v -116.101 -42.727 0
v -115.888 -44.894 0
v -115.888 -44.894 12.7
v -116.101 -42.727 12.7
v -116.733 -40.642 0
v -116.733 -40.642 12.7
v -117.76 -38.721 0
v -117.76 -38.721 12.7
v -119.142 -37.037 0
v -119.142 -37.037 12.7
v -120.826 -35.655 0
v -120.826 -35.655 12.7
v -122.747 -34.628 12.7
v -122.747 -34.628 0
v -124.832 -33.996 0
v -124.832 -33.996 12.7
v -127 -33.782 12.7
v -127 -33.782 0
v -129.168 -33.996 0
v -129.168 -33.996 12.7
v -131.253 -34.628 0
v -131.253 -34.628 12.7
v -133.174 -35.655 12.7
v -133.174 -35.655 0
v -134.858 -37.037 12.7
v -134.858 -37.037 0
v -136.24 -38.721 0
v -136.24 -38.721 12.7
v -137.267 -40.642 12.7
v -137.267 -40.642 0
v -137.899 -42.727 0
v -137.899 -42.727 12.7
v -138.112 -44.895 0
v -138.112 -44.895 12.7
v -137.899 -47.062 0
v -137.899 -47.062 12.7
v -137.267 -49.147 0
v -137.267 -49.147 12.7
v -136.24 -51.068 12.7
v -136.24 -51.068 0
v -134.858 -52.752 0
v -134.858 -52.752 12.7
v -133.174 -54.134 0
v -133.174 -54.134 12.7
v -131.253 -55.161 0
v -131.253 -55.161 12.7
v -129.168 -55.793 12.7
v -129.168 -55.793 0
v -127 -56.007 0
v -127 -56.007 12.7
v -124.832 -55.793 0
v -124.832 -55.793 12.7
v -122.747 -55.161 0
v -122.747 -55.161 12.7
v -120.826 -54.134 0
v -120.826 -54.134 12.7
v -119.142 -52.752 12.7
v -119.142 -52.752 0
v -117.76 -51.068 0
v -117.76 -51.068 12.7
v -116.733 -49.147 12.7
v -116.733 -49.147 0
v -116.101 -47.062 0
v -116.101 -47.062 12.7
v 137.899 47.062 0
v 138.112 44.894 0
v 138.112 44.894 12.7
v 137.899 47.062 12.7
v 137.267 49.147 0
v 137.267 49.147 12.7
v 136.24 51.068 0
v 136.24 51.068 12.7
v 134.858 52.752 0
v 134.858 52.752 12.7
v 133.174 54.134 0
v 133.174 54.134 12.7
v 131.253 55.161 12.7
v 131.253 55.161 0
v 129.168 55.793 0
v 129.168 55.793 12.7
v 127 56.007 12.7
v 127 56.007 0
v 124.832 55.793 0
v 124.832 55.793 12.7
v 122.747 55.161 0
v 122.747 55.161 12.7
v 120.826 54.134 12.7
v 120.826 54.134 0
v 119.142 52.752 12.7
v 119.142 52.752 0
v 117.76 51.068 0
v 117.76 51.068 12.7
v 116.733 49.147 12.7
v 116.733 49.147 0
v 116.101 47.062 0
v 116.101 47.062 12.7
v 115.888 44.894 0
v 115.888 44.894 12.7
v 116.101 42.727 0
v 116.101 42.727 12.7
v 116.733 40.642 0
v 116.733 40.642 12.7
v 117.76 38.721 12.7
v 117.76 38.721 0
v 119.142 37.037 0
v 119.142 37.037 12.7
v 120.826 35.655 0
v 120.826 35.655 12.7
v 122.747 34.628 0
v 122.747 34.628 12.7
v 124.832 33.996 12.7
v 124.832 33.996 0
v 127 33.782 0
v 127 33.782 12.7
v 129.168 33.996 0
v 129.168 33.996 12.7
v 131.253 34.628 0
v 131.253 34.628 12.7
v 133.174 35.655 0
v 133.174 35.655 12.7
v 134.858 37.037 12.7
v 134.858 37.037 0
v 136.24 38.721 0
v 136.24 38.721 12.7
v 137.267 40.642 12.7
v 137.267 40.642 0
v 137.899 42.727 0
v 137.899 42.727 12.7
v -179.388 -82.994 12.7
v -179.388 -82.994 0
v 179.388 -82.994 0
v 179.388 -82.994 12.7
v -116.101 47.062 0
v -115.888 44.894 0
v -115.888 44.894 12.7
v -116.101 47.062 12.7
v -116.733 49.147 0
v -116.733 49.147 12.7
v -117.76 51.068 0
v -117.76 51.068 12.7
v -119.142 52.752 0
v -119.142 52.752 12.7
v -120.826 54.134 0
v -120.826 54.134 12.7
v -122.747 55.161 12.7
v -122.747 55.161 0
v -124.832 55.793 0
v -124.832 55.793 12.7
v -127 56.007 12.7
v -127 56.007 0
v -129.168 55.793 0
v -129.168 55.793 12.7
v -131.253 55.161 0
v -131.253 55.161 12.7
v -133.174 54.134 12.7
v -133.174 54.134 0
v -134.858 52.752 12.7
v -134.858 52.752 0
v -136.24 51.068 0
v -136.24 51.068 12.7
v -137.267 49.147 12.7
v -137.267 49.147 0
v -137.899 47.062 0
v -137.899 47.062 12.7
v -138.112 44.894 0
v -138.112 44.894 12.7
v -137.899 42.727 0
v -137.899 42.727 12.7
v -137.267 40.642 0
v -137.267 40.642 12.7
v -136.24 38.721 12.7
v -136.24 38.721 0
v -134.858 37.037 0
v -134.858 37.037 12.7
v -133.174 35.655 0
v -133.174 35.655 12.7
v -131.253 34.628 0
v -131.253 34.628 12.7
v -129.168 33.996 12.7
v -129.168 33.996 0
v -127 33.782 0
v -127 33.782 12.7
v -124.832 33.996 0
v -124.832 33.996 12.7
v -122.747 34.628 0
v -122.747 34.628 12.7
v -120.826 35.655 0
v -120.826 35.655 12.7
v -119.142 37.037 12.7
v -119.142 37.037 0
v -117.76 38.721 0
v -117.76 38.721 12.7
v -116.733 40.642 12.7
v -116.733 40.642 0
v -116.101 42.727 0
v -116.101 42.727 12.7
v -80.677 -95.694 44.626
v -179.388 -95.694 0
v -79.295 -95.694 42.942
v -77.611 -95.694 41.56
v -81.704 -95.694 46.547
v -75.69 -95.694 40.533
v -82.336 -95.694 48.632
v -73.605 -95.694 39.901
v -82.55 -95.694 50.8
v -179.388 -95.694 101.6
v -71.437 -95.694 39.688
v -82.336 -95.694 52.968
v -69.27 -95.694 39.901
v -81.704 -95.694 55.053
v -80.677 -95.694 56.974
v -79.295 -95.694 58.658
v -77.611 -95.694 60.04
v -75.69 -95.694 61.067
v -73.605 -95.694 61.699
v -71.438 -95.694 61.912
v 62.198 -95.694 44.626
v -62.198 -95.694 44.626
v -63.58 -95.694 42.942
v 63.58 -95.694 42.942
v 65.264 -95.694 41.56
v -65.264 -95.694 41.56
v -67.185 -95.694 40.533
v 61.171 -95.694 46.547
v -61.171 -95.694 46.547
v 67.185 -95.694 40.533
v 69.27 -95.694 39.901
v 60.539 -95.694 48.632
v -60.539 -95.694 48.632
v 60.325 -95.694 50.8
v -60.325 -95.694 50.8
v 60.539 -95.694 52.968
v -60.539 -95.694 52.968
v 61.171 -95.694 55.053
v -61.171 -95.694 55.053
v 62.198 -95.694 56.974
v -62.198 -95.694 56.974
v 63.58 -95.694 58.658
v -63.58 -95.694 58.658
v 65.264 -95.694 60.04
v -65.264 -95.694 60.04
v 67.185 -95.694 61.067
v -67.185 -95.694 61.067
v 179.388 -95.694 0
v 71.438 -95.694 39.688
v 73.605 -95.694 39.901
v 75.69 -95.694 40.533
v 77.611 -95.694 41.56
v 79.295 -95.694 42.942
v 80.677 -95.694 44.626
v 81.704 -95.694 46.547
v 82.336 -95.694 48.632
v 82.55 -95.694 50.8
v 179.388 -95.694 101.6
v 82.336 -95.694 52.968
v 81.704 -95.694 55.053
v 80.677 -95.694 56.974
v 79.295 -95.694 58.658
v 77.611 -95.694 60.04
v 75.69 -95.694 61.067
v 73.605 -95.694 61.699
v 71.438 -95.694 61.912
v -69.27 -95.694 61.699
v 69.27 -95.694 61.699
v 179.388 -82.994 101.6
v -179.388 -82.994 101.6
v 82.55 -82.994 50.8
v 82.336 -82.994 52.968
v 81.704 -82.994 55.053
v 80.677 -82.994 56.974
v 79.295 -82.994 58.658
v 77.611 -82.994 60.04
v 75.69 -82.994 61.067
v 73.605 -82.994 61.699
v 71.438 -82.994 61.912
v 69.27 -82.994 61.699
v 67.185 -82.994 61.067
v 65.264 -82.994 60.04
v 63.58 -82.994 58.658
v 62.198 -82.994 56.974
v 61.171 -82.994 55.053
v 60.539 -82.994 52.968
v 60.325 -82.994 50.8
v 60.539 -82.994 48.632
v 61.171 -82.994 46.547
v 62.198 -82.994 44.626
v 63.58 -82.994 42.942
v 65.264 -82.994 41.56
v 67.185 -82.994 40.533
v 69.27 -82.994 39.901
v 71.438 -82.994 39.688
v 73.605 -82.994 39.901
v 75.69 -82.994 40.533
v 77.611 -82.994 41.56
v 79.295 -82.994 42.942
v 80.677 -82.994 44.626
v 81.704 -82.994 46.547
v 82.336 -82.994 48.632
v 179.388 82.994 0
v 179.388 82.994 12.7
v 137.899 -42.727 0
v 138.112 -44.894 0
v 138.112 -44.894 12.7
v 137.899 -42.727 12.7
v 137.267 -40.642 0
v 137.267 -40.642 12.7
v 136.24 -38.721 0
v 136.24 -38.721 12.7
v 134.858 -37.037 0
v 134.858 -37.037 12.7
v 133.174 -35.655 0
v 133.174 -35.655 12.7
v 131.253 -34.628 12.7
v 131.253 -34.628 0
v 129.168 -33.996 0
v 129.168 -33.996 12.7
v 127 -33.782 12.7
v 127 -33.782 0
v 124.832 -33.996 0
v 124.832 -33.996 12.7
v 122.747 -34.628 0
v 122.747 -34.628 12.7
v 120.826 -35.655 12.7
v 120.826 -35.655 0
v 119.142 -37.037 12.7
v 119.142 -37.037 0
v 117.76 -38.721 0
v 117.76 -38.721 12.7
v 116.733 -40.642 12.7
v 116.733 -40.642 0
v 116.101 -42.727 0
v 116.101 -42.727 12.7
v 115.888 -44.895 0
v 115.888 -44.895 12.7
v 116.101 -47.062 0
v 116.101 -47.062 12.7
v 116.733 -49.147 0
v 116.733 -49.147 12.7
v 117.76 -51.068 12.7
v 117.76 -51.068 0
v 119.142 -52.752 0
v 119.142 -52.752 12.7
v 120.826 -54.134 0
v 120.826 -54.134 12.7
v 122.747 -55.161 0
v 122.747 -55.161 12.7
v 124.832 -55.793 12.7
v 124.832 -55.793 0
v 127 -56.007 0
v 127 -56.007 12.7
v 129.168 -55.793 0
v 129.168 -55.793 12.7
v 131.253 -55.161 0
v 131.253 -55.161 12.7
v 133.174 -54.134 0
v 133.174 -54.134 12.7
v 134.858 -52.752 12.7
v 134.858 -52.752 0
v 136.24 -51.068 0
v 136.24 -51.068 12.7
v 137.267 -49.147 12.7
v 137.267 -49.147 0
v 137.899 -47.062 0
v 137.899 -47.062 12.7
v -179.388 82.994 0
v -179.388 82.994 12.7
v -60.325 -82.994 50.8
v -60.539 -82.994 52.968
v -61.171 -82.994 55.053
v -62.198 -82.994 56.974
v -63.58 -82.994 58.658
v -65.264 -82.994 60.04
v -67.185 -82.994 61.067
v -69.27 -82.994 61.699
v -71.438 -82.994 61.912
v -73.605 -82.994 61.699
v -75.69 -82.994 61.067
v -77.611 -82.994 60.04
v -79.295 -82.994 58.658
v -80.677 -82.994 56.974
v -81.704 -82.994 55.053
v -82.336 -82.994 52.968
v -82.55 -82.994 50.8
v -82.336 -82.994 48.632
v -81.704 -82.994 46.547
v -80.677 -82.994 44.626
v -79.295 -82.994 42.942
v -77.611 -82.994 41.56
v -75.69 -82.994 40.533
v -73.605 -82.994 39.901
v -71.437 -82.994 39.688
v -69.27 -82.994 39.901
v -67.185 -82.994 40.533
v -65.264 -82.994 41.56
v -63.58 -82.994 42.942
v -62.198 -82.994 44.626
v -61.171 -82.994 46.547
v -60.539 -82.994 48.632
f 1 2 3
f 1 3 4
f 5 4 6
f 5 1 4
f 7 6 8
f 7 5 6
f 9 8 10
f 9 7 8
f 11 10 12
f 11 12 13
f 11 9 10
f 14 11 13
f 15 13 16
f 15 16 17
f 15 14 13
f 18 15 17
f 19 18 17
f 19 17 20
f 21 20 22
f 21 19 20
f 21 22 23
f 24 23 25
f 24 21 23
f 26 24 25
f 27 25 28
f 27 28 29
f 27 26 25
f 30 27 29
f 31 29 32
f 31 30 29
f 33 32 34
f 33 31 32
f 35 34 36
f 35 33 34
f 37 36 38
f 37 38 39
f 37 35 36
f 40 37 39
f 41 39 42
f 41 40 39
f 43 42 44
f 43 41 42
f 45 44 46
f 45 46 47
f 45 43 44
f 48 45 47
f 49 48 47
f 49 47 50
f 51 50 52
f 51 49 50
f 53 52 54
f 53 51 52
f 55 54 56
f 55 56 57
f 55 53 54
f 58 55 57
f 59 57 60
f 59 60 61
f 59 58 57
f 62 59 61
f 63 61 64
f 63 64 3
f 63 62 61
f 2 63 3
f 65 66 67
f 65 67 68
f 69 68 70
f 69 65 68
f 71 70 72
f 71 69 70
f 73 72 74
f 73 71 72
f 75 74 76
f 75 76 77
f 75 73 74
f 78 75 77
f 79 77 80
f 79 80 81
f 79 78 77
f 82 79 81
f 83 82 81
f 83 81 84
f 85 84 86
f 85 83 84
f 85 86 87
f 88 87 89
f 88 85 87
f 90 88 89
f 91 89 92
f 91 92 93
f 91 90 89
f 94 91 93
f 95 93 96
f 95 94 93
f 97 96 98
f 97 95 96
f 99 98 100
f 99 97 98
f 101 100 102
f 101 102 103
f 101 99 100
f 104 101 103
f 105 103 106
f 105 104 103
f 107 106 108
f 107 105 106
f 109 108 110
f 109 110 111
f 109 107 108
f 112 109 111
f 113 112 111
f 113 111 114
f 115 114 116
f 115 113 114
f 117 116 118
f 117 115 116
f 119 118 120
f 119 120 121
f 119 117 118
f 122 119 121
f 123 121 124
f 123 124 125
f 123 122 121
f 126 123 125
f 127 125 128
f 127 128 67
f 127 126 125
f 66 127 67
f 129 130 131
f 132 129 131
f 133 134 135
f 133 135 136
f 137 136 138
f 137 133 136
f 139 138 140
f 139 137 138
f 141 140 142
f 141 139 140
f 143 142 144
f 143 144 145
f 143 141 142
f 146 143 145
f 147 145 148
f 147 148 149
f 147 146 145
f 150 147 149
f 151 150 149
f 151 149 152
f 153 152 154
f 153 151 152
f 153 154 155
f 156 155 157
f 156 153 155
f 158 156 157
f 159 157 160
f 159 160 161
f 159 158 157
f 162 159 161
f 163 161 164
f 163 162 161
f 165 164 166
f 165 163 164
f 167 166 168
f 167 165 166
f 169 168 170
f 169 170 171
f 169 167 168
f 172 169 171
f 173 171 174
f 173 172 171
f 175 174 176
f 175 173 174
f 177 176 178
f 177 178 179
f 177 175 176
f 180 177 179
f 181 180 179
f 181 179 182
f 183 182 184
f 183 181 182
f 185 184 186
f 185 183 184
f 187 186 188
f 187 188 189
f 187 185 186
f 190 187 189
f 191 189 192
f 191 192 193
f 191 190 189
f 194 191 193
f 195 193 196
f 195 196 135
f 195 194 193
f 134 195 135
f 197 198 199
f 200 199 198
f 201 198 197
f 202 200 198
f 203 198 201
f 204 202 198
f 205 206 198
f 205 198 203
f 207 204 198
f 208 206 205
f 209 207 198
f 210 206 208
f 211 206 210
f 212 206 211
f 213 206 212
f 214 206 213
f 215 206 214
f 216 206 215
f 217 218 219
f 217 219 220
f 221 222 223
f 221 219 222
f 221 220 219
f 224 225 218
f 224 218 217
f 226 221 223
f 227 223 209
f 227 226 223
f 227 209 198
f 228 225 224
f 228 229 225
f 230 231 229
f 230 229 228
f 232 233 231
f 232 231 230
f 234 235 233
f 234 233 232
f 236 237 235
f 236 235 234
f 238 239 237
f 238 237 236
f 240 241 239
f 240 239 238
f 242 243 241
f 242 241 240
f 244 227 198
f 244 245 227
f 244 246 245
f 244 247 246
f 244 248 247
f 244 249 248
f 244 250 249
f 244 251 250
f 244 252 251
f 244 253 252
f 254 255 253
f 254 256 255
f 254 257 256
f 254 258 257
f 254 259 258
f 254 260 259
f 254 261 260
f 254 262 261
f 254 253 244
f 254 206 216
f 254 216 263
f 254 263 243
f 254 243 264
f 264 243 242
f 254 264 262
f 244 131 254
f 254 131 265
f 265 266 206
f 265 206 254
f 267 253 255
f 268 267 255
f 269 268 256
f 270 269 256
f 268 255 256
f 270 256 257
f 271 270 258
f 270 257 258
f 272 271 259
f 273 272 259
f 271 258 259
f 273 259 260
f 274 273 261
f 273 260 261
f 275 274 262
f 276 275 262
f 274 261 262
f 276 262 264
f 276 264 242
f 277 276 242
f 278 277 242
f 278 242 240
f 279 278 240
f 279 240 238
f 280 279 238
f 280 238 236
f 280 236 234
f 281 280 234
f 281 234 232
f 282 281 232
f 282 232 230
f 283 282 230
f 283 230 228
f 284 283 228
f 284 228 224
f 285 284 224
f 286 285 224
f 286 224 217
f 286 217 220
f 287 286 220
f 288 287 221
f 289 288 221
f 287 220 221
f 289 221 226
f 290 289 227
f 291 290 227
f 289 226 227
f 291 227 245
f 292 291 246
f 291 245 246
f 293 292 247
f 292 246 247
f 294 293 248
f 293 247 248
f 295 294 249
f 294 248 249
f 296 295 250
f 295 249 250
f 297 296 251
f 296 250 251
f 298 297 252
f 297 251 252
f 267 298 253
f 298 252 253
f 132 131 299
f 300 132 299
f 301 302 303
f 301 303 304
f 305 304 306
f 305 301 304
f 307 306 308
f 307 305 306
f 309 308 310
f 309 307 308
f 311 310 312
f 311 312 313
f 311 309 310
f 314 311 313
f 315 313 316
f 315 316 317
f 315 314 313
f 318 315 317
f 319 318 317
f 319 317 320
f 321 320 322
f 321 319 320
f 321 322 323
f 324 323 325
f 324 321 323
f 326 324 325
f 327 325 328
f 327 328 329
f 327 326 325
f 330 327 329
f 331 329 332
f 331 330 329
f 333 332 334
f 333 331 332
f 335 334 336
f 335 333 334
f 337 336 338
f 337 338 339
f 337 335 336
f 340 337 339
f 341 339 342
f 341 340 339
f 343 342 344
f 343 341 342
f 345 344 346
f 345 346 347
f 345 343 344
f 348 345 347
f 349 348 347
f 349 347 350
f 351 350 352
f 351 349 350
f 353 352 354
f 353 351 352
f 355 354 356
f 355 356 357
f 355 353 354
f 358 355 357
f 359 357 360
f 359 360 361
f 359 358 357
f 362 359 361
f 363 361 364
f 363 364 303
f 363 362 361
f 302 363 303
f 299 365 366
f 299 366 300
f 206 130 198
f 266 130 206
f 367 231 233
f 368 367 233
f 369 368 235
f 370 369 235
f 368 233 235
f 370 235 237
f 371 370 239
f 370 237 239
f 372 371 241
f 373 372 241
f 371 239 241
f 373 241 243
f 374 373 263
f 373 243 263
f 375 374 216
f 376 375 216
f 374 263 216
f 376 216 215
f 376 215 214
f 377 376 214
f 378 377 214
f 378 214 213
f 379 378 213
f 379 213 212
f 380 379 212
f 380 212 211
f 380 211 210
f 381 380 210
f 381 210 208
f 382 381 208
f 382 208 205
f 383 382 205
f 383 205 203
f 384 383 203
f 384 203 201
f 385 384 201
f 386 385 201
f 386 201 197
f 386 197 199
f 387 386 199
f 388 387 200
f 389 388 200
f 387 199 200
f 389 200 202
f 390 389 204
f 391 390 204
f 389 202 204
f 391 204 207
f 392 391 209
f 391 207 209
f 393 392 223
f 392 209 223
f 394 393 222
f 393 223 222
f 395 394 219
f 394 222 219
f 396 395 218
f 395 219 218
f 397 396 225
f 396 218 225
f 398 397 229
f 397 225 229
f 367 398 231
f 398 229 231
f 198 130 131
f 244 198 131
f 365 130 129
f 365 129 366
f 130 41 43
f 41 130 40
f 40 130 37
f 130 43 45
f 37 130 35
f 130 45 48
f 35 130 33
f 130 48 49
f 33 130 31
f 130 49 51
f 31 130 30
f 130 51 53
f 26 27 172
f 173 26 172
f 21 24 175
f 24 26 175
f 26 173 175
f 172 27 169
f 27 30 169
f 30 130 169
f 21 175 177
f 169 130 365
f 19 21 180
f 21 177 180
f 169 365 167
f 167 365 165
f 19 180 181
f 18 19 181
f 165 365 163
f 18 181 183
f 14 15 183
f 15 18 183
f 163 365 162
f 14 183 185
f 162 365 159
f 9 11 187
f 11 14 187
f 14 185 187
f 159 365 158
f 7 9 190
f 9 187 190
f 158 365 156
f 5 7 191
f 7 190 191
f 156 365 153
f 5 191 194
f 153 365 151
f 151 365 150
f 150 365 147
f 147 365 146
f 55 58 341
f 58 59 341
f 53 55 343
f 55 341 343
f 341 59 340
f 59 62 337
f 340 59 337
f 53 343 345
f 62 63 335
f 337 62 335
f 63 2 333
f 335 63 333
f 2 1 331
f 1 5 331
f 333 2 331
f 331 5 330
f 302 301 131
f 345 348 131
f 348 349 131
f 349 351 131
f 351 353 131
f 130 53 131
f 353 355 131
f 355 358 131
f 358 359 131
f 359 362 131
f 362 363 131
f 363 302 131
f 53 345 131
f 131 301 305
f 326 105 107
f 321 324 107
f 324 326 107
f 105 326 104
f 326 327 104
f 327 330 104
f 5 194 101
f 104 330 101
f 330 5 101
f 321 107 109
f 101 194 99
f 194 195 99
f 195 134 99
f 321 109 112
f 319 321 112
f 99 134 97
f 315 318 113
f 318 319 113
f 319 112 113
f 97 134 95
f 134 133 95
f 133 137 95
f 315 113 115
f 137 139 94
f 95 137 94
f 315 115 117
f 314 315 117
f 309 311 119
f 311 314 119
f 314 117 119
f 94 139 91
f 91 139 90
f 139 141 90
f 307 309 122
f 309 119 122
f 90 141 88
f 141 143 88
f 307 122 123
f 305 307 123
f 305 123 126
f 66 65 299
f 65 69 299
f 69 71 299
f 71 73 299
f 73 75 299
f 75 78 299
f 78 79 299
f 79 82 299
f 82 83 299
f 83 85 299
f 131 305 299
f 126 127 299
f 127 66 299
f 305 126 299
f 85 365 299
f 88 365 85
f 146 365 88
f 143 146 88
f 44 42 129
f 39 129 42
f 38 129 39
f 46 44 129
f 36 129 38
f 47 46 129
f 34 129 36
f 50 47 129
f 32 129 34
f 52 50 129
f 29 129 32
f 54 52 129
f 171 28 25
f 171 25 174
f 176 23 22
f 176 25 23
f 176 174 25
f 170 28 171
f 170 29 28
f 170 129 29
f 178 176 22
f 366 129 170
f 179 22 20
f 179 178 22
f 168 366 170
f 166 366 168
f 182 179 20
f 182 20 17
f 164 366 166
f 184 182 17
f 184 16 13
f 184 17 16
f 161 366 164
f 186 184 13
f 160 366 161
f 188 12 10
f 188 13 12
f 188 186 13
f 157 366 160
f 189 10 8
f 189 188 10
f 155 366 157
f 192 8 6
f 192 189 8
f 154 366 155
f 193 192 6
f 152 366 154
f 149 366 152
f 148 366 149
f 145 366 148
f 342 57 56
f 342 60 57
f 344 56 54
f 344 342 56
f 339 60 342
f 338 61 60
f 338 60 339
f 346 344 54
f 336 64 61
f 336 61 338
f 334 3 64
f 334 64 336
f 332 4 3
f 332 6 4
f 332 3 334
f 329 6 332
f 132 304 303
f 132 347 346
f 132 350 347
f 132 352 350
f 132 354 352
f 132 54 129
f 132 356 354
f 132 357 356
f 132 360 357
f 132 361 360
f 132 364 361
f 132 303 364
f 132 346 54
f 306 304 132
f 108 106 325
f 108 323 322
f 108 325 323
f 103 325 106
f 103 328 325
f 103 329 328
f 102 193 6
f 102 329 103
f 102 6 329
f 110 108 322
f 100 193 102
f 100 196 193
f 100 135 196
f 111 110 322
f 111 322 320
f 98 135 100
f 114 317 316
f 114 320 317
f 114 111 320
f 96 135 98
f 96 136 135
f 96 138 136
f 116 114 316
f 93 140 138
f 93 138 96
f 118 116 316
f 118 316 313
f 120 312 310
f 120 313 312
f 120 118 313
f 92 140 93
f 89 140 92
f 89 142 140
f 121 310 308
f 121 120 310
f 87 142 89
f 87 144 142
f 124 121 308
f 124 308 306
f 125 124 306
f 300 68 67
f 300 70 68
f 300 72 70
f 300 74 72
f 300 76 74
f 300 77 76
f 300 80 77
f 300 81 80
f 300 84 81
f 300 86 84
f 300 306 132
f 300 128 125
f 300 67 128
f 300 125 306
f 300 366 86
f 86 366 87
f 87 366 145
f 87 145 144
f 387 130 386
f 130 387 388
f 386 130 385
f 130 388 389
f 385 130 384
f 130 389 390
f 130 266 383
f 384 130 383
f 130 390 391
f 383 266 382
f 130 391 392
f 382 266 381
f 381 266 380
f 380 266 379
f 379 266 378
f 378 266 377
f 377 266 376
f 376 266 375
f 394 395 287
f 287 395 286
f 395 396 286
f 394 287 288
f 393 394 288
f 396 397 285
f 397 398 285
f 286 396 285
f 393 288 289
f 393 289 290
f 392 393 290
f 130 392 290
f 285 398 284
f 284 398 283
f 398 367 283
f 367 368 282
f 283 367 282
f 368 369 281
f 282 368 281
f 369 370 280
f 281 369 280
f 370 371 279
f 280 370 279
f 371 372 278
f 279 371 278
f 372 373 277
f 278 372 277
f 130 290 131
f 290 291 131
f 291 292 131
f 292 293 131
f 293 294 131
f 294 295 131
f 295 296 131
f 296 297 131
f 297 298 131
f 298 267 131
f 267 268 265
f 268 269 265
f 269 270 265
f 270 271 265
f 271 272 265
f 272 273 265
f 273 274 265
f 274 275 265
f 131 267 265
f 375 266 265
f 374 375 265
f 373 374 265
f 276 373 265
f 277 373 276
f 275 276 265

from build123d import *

# Parameters (mm, degrees)
F0_W     = 358.775
F0_H     = 165.989
F0_R     = 11.1125
F1_DEPTH = 12.7
F2_W     = 358.775
F2_H     = 101.6
F3_DEPTH = 12.7
F4_R     = 11.1125
F5_DEPTH = 178.69


with BuildPart() as f1:
    # F0 (on Top) → F1 (new body)
    with BuildSketch(Plane.XY):
        Rectangle(F0_W, F0_H)
        with Locations((-127, -44.8945)):
            Circle(F0_R, mode=Mode.SUBTRACT)
        with Locations((127, -44.8945)):
            Circle(F0_R, mode=Mode.SUBTRACT)
        with Locations((-127, 44.8945)):
            Circle(F0_R, mode=Mode.SUBTRACT)
        with Locations((127, 44.8945)):
            Circle(F0_R, mode=Mode.SUBTRACT)
    extrude(amount=F1_DEPTH)


with BuildPart() as f3:
    # F2 (on face) → F3 (new body)
    with BuildSketch(Plane.XZ.offset(82.9945)):
        with Locations((0, 50.8)):
            Rectangle(F2_W, F2_H)
    extrude(amount=F3_DEPTH)

    # F4 (on face) → F5 (cut, through all)
    with BuildSketch(Plane.XZ.offset(95.6945)):
        with Locations((-71.4375, 50.8)):
            Circle(F4_R)
        with Locations((71.4375, 50.8)):
            Circle(F4_R)
    extrude(amount=-F5_DEPTH, mode=Mode.SUBTRACT)


solid = Compound([f1.part, f3.part])
